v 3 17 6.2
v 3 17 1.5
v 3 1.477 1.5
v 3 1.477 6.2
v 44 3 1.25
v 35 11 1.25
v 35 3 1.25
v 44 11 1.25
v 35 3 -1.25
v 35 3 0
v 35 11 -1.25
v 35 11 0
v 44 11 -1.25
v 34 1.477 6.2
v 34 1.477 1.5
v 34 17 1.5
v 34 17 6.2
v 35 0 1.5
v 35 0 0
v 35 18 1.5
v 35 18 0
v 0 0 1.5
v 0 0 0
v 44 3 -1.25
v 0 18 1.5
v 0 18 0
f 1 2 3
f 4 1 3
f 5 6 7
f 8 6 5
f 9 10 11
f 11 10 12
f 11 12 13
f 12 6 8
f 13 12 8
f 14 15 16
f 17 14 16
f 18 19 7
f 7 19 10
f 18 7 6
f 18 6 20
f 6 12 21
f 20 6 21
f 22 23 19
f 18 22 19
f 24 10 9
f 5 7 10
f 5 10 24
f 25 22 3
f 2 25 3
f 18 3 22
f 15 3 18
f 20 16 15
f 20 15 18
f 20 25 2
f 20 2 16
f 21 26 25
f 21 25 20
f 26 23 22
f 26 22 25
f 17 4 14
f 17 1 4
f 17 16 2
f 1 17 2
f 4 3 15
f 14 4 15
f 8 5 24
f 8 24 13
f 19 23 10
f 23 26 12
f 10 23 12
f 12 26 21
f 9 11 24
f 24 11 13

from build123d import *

# Parameters (mm, degrees)
RESSALTO_EXTRUS_O1_DEPTH = 1.5
RESSALTO_EXTRUS_O2_DEPTH = 6.2
ESBO_O1_4_W              = 9
ESBO_O1_4_H              = 8
RESSALTO_EXTRUS_O3_DEPTH = 1.25


with BuildPart() as part:
    # Esboço1 → Ressalto-extrusão1 (new body)
    with BuildSketch(Plane.XY):
        Polygon((0, 18), (0, 0), (35, 0), (35, 3), (35, 11), (35, 18), align=None)
        Polygon((34, 17), (34, 9), (34, 1.477317564), (3, 1.477317564), (3, 17), align=None, mode=Mode.SUBTRACT)
    extrude(amount=RESSALTO_EXTRUS_O1_DEPTH)

    # Esboço1<3> → Ressalto-extrusão2 (add)
    with BuildSketch(Plane.XY):
        Polygon((34, 1.477317564), (34, 9), (34, 17), (3, 17), (3, 1.477317564), align=None)
    extrude(amount=RESSALTO_EXTRUS_O2_DEPTH)

    # Esboço1<4> → Ressalto-extrusão3 (add, symmetric)
    with BuildSketch(Plane.XY):
        with Locations((39.5, 7)):
            Rectangle(ESBO_O1_4_W, ESBO_O1_4_H)
    extrude(amount=RESSALTO_EXTRUS_O3_DEPTH, both=True)


solid = part.part
